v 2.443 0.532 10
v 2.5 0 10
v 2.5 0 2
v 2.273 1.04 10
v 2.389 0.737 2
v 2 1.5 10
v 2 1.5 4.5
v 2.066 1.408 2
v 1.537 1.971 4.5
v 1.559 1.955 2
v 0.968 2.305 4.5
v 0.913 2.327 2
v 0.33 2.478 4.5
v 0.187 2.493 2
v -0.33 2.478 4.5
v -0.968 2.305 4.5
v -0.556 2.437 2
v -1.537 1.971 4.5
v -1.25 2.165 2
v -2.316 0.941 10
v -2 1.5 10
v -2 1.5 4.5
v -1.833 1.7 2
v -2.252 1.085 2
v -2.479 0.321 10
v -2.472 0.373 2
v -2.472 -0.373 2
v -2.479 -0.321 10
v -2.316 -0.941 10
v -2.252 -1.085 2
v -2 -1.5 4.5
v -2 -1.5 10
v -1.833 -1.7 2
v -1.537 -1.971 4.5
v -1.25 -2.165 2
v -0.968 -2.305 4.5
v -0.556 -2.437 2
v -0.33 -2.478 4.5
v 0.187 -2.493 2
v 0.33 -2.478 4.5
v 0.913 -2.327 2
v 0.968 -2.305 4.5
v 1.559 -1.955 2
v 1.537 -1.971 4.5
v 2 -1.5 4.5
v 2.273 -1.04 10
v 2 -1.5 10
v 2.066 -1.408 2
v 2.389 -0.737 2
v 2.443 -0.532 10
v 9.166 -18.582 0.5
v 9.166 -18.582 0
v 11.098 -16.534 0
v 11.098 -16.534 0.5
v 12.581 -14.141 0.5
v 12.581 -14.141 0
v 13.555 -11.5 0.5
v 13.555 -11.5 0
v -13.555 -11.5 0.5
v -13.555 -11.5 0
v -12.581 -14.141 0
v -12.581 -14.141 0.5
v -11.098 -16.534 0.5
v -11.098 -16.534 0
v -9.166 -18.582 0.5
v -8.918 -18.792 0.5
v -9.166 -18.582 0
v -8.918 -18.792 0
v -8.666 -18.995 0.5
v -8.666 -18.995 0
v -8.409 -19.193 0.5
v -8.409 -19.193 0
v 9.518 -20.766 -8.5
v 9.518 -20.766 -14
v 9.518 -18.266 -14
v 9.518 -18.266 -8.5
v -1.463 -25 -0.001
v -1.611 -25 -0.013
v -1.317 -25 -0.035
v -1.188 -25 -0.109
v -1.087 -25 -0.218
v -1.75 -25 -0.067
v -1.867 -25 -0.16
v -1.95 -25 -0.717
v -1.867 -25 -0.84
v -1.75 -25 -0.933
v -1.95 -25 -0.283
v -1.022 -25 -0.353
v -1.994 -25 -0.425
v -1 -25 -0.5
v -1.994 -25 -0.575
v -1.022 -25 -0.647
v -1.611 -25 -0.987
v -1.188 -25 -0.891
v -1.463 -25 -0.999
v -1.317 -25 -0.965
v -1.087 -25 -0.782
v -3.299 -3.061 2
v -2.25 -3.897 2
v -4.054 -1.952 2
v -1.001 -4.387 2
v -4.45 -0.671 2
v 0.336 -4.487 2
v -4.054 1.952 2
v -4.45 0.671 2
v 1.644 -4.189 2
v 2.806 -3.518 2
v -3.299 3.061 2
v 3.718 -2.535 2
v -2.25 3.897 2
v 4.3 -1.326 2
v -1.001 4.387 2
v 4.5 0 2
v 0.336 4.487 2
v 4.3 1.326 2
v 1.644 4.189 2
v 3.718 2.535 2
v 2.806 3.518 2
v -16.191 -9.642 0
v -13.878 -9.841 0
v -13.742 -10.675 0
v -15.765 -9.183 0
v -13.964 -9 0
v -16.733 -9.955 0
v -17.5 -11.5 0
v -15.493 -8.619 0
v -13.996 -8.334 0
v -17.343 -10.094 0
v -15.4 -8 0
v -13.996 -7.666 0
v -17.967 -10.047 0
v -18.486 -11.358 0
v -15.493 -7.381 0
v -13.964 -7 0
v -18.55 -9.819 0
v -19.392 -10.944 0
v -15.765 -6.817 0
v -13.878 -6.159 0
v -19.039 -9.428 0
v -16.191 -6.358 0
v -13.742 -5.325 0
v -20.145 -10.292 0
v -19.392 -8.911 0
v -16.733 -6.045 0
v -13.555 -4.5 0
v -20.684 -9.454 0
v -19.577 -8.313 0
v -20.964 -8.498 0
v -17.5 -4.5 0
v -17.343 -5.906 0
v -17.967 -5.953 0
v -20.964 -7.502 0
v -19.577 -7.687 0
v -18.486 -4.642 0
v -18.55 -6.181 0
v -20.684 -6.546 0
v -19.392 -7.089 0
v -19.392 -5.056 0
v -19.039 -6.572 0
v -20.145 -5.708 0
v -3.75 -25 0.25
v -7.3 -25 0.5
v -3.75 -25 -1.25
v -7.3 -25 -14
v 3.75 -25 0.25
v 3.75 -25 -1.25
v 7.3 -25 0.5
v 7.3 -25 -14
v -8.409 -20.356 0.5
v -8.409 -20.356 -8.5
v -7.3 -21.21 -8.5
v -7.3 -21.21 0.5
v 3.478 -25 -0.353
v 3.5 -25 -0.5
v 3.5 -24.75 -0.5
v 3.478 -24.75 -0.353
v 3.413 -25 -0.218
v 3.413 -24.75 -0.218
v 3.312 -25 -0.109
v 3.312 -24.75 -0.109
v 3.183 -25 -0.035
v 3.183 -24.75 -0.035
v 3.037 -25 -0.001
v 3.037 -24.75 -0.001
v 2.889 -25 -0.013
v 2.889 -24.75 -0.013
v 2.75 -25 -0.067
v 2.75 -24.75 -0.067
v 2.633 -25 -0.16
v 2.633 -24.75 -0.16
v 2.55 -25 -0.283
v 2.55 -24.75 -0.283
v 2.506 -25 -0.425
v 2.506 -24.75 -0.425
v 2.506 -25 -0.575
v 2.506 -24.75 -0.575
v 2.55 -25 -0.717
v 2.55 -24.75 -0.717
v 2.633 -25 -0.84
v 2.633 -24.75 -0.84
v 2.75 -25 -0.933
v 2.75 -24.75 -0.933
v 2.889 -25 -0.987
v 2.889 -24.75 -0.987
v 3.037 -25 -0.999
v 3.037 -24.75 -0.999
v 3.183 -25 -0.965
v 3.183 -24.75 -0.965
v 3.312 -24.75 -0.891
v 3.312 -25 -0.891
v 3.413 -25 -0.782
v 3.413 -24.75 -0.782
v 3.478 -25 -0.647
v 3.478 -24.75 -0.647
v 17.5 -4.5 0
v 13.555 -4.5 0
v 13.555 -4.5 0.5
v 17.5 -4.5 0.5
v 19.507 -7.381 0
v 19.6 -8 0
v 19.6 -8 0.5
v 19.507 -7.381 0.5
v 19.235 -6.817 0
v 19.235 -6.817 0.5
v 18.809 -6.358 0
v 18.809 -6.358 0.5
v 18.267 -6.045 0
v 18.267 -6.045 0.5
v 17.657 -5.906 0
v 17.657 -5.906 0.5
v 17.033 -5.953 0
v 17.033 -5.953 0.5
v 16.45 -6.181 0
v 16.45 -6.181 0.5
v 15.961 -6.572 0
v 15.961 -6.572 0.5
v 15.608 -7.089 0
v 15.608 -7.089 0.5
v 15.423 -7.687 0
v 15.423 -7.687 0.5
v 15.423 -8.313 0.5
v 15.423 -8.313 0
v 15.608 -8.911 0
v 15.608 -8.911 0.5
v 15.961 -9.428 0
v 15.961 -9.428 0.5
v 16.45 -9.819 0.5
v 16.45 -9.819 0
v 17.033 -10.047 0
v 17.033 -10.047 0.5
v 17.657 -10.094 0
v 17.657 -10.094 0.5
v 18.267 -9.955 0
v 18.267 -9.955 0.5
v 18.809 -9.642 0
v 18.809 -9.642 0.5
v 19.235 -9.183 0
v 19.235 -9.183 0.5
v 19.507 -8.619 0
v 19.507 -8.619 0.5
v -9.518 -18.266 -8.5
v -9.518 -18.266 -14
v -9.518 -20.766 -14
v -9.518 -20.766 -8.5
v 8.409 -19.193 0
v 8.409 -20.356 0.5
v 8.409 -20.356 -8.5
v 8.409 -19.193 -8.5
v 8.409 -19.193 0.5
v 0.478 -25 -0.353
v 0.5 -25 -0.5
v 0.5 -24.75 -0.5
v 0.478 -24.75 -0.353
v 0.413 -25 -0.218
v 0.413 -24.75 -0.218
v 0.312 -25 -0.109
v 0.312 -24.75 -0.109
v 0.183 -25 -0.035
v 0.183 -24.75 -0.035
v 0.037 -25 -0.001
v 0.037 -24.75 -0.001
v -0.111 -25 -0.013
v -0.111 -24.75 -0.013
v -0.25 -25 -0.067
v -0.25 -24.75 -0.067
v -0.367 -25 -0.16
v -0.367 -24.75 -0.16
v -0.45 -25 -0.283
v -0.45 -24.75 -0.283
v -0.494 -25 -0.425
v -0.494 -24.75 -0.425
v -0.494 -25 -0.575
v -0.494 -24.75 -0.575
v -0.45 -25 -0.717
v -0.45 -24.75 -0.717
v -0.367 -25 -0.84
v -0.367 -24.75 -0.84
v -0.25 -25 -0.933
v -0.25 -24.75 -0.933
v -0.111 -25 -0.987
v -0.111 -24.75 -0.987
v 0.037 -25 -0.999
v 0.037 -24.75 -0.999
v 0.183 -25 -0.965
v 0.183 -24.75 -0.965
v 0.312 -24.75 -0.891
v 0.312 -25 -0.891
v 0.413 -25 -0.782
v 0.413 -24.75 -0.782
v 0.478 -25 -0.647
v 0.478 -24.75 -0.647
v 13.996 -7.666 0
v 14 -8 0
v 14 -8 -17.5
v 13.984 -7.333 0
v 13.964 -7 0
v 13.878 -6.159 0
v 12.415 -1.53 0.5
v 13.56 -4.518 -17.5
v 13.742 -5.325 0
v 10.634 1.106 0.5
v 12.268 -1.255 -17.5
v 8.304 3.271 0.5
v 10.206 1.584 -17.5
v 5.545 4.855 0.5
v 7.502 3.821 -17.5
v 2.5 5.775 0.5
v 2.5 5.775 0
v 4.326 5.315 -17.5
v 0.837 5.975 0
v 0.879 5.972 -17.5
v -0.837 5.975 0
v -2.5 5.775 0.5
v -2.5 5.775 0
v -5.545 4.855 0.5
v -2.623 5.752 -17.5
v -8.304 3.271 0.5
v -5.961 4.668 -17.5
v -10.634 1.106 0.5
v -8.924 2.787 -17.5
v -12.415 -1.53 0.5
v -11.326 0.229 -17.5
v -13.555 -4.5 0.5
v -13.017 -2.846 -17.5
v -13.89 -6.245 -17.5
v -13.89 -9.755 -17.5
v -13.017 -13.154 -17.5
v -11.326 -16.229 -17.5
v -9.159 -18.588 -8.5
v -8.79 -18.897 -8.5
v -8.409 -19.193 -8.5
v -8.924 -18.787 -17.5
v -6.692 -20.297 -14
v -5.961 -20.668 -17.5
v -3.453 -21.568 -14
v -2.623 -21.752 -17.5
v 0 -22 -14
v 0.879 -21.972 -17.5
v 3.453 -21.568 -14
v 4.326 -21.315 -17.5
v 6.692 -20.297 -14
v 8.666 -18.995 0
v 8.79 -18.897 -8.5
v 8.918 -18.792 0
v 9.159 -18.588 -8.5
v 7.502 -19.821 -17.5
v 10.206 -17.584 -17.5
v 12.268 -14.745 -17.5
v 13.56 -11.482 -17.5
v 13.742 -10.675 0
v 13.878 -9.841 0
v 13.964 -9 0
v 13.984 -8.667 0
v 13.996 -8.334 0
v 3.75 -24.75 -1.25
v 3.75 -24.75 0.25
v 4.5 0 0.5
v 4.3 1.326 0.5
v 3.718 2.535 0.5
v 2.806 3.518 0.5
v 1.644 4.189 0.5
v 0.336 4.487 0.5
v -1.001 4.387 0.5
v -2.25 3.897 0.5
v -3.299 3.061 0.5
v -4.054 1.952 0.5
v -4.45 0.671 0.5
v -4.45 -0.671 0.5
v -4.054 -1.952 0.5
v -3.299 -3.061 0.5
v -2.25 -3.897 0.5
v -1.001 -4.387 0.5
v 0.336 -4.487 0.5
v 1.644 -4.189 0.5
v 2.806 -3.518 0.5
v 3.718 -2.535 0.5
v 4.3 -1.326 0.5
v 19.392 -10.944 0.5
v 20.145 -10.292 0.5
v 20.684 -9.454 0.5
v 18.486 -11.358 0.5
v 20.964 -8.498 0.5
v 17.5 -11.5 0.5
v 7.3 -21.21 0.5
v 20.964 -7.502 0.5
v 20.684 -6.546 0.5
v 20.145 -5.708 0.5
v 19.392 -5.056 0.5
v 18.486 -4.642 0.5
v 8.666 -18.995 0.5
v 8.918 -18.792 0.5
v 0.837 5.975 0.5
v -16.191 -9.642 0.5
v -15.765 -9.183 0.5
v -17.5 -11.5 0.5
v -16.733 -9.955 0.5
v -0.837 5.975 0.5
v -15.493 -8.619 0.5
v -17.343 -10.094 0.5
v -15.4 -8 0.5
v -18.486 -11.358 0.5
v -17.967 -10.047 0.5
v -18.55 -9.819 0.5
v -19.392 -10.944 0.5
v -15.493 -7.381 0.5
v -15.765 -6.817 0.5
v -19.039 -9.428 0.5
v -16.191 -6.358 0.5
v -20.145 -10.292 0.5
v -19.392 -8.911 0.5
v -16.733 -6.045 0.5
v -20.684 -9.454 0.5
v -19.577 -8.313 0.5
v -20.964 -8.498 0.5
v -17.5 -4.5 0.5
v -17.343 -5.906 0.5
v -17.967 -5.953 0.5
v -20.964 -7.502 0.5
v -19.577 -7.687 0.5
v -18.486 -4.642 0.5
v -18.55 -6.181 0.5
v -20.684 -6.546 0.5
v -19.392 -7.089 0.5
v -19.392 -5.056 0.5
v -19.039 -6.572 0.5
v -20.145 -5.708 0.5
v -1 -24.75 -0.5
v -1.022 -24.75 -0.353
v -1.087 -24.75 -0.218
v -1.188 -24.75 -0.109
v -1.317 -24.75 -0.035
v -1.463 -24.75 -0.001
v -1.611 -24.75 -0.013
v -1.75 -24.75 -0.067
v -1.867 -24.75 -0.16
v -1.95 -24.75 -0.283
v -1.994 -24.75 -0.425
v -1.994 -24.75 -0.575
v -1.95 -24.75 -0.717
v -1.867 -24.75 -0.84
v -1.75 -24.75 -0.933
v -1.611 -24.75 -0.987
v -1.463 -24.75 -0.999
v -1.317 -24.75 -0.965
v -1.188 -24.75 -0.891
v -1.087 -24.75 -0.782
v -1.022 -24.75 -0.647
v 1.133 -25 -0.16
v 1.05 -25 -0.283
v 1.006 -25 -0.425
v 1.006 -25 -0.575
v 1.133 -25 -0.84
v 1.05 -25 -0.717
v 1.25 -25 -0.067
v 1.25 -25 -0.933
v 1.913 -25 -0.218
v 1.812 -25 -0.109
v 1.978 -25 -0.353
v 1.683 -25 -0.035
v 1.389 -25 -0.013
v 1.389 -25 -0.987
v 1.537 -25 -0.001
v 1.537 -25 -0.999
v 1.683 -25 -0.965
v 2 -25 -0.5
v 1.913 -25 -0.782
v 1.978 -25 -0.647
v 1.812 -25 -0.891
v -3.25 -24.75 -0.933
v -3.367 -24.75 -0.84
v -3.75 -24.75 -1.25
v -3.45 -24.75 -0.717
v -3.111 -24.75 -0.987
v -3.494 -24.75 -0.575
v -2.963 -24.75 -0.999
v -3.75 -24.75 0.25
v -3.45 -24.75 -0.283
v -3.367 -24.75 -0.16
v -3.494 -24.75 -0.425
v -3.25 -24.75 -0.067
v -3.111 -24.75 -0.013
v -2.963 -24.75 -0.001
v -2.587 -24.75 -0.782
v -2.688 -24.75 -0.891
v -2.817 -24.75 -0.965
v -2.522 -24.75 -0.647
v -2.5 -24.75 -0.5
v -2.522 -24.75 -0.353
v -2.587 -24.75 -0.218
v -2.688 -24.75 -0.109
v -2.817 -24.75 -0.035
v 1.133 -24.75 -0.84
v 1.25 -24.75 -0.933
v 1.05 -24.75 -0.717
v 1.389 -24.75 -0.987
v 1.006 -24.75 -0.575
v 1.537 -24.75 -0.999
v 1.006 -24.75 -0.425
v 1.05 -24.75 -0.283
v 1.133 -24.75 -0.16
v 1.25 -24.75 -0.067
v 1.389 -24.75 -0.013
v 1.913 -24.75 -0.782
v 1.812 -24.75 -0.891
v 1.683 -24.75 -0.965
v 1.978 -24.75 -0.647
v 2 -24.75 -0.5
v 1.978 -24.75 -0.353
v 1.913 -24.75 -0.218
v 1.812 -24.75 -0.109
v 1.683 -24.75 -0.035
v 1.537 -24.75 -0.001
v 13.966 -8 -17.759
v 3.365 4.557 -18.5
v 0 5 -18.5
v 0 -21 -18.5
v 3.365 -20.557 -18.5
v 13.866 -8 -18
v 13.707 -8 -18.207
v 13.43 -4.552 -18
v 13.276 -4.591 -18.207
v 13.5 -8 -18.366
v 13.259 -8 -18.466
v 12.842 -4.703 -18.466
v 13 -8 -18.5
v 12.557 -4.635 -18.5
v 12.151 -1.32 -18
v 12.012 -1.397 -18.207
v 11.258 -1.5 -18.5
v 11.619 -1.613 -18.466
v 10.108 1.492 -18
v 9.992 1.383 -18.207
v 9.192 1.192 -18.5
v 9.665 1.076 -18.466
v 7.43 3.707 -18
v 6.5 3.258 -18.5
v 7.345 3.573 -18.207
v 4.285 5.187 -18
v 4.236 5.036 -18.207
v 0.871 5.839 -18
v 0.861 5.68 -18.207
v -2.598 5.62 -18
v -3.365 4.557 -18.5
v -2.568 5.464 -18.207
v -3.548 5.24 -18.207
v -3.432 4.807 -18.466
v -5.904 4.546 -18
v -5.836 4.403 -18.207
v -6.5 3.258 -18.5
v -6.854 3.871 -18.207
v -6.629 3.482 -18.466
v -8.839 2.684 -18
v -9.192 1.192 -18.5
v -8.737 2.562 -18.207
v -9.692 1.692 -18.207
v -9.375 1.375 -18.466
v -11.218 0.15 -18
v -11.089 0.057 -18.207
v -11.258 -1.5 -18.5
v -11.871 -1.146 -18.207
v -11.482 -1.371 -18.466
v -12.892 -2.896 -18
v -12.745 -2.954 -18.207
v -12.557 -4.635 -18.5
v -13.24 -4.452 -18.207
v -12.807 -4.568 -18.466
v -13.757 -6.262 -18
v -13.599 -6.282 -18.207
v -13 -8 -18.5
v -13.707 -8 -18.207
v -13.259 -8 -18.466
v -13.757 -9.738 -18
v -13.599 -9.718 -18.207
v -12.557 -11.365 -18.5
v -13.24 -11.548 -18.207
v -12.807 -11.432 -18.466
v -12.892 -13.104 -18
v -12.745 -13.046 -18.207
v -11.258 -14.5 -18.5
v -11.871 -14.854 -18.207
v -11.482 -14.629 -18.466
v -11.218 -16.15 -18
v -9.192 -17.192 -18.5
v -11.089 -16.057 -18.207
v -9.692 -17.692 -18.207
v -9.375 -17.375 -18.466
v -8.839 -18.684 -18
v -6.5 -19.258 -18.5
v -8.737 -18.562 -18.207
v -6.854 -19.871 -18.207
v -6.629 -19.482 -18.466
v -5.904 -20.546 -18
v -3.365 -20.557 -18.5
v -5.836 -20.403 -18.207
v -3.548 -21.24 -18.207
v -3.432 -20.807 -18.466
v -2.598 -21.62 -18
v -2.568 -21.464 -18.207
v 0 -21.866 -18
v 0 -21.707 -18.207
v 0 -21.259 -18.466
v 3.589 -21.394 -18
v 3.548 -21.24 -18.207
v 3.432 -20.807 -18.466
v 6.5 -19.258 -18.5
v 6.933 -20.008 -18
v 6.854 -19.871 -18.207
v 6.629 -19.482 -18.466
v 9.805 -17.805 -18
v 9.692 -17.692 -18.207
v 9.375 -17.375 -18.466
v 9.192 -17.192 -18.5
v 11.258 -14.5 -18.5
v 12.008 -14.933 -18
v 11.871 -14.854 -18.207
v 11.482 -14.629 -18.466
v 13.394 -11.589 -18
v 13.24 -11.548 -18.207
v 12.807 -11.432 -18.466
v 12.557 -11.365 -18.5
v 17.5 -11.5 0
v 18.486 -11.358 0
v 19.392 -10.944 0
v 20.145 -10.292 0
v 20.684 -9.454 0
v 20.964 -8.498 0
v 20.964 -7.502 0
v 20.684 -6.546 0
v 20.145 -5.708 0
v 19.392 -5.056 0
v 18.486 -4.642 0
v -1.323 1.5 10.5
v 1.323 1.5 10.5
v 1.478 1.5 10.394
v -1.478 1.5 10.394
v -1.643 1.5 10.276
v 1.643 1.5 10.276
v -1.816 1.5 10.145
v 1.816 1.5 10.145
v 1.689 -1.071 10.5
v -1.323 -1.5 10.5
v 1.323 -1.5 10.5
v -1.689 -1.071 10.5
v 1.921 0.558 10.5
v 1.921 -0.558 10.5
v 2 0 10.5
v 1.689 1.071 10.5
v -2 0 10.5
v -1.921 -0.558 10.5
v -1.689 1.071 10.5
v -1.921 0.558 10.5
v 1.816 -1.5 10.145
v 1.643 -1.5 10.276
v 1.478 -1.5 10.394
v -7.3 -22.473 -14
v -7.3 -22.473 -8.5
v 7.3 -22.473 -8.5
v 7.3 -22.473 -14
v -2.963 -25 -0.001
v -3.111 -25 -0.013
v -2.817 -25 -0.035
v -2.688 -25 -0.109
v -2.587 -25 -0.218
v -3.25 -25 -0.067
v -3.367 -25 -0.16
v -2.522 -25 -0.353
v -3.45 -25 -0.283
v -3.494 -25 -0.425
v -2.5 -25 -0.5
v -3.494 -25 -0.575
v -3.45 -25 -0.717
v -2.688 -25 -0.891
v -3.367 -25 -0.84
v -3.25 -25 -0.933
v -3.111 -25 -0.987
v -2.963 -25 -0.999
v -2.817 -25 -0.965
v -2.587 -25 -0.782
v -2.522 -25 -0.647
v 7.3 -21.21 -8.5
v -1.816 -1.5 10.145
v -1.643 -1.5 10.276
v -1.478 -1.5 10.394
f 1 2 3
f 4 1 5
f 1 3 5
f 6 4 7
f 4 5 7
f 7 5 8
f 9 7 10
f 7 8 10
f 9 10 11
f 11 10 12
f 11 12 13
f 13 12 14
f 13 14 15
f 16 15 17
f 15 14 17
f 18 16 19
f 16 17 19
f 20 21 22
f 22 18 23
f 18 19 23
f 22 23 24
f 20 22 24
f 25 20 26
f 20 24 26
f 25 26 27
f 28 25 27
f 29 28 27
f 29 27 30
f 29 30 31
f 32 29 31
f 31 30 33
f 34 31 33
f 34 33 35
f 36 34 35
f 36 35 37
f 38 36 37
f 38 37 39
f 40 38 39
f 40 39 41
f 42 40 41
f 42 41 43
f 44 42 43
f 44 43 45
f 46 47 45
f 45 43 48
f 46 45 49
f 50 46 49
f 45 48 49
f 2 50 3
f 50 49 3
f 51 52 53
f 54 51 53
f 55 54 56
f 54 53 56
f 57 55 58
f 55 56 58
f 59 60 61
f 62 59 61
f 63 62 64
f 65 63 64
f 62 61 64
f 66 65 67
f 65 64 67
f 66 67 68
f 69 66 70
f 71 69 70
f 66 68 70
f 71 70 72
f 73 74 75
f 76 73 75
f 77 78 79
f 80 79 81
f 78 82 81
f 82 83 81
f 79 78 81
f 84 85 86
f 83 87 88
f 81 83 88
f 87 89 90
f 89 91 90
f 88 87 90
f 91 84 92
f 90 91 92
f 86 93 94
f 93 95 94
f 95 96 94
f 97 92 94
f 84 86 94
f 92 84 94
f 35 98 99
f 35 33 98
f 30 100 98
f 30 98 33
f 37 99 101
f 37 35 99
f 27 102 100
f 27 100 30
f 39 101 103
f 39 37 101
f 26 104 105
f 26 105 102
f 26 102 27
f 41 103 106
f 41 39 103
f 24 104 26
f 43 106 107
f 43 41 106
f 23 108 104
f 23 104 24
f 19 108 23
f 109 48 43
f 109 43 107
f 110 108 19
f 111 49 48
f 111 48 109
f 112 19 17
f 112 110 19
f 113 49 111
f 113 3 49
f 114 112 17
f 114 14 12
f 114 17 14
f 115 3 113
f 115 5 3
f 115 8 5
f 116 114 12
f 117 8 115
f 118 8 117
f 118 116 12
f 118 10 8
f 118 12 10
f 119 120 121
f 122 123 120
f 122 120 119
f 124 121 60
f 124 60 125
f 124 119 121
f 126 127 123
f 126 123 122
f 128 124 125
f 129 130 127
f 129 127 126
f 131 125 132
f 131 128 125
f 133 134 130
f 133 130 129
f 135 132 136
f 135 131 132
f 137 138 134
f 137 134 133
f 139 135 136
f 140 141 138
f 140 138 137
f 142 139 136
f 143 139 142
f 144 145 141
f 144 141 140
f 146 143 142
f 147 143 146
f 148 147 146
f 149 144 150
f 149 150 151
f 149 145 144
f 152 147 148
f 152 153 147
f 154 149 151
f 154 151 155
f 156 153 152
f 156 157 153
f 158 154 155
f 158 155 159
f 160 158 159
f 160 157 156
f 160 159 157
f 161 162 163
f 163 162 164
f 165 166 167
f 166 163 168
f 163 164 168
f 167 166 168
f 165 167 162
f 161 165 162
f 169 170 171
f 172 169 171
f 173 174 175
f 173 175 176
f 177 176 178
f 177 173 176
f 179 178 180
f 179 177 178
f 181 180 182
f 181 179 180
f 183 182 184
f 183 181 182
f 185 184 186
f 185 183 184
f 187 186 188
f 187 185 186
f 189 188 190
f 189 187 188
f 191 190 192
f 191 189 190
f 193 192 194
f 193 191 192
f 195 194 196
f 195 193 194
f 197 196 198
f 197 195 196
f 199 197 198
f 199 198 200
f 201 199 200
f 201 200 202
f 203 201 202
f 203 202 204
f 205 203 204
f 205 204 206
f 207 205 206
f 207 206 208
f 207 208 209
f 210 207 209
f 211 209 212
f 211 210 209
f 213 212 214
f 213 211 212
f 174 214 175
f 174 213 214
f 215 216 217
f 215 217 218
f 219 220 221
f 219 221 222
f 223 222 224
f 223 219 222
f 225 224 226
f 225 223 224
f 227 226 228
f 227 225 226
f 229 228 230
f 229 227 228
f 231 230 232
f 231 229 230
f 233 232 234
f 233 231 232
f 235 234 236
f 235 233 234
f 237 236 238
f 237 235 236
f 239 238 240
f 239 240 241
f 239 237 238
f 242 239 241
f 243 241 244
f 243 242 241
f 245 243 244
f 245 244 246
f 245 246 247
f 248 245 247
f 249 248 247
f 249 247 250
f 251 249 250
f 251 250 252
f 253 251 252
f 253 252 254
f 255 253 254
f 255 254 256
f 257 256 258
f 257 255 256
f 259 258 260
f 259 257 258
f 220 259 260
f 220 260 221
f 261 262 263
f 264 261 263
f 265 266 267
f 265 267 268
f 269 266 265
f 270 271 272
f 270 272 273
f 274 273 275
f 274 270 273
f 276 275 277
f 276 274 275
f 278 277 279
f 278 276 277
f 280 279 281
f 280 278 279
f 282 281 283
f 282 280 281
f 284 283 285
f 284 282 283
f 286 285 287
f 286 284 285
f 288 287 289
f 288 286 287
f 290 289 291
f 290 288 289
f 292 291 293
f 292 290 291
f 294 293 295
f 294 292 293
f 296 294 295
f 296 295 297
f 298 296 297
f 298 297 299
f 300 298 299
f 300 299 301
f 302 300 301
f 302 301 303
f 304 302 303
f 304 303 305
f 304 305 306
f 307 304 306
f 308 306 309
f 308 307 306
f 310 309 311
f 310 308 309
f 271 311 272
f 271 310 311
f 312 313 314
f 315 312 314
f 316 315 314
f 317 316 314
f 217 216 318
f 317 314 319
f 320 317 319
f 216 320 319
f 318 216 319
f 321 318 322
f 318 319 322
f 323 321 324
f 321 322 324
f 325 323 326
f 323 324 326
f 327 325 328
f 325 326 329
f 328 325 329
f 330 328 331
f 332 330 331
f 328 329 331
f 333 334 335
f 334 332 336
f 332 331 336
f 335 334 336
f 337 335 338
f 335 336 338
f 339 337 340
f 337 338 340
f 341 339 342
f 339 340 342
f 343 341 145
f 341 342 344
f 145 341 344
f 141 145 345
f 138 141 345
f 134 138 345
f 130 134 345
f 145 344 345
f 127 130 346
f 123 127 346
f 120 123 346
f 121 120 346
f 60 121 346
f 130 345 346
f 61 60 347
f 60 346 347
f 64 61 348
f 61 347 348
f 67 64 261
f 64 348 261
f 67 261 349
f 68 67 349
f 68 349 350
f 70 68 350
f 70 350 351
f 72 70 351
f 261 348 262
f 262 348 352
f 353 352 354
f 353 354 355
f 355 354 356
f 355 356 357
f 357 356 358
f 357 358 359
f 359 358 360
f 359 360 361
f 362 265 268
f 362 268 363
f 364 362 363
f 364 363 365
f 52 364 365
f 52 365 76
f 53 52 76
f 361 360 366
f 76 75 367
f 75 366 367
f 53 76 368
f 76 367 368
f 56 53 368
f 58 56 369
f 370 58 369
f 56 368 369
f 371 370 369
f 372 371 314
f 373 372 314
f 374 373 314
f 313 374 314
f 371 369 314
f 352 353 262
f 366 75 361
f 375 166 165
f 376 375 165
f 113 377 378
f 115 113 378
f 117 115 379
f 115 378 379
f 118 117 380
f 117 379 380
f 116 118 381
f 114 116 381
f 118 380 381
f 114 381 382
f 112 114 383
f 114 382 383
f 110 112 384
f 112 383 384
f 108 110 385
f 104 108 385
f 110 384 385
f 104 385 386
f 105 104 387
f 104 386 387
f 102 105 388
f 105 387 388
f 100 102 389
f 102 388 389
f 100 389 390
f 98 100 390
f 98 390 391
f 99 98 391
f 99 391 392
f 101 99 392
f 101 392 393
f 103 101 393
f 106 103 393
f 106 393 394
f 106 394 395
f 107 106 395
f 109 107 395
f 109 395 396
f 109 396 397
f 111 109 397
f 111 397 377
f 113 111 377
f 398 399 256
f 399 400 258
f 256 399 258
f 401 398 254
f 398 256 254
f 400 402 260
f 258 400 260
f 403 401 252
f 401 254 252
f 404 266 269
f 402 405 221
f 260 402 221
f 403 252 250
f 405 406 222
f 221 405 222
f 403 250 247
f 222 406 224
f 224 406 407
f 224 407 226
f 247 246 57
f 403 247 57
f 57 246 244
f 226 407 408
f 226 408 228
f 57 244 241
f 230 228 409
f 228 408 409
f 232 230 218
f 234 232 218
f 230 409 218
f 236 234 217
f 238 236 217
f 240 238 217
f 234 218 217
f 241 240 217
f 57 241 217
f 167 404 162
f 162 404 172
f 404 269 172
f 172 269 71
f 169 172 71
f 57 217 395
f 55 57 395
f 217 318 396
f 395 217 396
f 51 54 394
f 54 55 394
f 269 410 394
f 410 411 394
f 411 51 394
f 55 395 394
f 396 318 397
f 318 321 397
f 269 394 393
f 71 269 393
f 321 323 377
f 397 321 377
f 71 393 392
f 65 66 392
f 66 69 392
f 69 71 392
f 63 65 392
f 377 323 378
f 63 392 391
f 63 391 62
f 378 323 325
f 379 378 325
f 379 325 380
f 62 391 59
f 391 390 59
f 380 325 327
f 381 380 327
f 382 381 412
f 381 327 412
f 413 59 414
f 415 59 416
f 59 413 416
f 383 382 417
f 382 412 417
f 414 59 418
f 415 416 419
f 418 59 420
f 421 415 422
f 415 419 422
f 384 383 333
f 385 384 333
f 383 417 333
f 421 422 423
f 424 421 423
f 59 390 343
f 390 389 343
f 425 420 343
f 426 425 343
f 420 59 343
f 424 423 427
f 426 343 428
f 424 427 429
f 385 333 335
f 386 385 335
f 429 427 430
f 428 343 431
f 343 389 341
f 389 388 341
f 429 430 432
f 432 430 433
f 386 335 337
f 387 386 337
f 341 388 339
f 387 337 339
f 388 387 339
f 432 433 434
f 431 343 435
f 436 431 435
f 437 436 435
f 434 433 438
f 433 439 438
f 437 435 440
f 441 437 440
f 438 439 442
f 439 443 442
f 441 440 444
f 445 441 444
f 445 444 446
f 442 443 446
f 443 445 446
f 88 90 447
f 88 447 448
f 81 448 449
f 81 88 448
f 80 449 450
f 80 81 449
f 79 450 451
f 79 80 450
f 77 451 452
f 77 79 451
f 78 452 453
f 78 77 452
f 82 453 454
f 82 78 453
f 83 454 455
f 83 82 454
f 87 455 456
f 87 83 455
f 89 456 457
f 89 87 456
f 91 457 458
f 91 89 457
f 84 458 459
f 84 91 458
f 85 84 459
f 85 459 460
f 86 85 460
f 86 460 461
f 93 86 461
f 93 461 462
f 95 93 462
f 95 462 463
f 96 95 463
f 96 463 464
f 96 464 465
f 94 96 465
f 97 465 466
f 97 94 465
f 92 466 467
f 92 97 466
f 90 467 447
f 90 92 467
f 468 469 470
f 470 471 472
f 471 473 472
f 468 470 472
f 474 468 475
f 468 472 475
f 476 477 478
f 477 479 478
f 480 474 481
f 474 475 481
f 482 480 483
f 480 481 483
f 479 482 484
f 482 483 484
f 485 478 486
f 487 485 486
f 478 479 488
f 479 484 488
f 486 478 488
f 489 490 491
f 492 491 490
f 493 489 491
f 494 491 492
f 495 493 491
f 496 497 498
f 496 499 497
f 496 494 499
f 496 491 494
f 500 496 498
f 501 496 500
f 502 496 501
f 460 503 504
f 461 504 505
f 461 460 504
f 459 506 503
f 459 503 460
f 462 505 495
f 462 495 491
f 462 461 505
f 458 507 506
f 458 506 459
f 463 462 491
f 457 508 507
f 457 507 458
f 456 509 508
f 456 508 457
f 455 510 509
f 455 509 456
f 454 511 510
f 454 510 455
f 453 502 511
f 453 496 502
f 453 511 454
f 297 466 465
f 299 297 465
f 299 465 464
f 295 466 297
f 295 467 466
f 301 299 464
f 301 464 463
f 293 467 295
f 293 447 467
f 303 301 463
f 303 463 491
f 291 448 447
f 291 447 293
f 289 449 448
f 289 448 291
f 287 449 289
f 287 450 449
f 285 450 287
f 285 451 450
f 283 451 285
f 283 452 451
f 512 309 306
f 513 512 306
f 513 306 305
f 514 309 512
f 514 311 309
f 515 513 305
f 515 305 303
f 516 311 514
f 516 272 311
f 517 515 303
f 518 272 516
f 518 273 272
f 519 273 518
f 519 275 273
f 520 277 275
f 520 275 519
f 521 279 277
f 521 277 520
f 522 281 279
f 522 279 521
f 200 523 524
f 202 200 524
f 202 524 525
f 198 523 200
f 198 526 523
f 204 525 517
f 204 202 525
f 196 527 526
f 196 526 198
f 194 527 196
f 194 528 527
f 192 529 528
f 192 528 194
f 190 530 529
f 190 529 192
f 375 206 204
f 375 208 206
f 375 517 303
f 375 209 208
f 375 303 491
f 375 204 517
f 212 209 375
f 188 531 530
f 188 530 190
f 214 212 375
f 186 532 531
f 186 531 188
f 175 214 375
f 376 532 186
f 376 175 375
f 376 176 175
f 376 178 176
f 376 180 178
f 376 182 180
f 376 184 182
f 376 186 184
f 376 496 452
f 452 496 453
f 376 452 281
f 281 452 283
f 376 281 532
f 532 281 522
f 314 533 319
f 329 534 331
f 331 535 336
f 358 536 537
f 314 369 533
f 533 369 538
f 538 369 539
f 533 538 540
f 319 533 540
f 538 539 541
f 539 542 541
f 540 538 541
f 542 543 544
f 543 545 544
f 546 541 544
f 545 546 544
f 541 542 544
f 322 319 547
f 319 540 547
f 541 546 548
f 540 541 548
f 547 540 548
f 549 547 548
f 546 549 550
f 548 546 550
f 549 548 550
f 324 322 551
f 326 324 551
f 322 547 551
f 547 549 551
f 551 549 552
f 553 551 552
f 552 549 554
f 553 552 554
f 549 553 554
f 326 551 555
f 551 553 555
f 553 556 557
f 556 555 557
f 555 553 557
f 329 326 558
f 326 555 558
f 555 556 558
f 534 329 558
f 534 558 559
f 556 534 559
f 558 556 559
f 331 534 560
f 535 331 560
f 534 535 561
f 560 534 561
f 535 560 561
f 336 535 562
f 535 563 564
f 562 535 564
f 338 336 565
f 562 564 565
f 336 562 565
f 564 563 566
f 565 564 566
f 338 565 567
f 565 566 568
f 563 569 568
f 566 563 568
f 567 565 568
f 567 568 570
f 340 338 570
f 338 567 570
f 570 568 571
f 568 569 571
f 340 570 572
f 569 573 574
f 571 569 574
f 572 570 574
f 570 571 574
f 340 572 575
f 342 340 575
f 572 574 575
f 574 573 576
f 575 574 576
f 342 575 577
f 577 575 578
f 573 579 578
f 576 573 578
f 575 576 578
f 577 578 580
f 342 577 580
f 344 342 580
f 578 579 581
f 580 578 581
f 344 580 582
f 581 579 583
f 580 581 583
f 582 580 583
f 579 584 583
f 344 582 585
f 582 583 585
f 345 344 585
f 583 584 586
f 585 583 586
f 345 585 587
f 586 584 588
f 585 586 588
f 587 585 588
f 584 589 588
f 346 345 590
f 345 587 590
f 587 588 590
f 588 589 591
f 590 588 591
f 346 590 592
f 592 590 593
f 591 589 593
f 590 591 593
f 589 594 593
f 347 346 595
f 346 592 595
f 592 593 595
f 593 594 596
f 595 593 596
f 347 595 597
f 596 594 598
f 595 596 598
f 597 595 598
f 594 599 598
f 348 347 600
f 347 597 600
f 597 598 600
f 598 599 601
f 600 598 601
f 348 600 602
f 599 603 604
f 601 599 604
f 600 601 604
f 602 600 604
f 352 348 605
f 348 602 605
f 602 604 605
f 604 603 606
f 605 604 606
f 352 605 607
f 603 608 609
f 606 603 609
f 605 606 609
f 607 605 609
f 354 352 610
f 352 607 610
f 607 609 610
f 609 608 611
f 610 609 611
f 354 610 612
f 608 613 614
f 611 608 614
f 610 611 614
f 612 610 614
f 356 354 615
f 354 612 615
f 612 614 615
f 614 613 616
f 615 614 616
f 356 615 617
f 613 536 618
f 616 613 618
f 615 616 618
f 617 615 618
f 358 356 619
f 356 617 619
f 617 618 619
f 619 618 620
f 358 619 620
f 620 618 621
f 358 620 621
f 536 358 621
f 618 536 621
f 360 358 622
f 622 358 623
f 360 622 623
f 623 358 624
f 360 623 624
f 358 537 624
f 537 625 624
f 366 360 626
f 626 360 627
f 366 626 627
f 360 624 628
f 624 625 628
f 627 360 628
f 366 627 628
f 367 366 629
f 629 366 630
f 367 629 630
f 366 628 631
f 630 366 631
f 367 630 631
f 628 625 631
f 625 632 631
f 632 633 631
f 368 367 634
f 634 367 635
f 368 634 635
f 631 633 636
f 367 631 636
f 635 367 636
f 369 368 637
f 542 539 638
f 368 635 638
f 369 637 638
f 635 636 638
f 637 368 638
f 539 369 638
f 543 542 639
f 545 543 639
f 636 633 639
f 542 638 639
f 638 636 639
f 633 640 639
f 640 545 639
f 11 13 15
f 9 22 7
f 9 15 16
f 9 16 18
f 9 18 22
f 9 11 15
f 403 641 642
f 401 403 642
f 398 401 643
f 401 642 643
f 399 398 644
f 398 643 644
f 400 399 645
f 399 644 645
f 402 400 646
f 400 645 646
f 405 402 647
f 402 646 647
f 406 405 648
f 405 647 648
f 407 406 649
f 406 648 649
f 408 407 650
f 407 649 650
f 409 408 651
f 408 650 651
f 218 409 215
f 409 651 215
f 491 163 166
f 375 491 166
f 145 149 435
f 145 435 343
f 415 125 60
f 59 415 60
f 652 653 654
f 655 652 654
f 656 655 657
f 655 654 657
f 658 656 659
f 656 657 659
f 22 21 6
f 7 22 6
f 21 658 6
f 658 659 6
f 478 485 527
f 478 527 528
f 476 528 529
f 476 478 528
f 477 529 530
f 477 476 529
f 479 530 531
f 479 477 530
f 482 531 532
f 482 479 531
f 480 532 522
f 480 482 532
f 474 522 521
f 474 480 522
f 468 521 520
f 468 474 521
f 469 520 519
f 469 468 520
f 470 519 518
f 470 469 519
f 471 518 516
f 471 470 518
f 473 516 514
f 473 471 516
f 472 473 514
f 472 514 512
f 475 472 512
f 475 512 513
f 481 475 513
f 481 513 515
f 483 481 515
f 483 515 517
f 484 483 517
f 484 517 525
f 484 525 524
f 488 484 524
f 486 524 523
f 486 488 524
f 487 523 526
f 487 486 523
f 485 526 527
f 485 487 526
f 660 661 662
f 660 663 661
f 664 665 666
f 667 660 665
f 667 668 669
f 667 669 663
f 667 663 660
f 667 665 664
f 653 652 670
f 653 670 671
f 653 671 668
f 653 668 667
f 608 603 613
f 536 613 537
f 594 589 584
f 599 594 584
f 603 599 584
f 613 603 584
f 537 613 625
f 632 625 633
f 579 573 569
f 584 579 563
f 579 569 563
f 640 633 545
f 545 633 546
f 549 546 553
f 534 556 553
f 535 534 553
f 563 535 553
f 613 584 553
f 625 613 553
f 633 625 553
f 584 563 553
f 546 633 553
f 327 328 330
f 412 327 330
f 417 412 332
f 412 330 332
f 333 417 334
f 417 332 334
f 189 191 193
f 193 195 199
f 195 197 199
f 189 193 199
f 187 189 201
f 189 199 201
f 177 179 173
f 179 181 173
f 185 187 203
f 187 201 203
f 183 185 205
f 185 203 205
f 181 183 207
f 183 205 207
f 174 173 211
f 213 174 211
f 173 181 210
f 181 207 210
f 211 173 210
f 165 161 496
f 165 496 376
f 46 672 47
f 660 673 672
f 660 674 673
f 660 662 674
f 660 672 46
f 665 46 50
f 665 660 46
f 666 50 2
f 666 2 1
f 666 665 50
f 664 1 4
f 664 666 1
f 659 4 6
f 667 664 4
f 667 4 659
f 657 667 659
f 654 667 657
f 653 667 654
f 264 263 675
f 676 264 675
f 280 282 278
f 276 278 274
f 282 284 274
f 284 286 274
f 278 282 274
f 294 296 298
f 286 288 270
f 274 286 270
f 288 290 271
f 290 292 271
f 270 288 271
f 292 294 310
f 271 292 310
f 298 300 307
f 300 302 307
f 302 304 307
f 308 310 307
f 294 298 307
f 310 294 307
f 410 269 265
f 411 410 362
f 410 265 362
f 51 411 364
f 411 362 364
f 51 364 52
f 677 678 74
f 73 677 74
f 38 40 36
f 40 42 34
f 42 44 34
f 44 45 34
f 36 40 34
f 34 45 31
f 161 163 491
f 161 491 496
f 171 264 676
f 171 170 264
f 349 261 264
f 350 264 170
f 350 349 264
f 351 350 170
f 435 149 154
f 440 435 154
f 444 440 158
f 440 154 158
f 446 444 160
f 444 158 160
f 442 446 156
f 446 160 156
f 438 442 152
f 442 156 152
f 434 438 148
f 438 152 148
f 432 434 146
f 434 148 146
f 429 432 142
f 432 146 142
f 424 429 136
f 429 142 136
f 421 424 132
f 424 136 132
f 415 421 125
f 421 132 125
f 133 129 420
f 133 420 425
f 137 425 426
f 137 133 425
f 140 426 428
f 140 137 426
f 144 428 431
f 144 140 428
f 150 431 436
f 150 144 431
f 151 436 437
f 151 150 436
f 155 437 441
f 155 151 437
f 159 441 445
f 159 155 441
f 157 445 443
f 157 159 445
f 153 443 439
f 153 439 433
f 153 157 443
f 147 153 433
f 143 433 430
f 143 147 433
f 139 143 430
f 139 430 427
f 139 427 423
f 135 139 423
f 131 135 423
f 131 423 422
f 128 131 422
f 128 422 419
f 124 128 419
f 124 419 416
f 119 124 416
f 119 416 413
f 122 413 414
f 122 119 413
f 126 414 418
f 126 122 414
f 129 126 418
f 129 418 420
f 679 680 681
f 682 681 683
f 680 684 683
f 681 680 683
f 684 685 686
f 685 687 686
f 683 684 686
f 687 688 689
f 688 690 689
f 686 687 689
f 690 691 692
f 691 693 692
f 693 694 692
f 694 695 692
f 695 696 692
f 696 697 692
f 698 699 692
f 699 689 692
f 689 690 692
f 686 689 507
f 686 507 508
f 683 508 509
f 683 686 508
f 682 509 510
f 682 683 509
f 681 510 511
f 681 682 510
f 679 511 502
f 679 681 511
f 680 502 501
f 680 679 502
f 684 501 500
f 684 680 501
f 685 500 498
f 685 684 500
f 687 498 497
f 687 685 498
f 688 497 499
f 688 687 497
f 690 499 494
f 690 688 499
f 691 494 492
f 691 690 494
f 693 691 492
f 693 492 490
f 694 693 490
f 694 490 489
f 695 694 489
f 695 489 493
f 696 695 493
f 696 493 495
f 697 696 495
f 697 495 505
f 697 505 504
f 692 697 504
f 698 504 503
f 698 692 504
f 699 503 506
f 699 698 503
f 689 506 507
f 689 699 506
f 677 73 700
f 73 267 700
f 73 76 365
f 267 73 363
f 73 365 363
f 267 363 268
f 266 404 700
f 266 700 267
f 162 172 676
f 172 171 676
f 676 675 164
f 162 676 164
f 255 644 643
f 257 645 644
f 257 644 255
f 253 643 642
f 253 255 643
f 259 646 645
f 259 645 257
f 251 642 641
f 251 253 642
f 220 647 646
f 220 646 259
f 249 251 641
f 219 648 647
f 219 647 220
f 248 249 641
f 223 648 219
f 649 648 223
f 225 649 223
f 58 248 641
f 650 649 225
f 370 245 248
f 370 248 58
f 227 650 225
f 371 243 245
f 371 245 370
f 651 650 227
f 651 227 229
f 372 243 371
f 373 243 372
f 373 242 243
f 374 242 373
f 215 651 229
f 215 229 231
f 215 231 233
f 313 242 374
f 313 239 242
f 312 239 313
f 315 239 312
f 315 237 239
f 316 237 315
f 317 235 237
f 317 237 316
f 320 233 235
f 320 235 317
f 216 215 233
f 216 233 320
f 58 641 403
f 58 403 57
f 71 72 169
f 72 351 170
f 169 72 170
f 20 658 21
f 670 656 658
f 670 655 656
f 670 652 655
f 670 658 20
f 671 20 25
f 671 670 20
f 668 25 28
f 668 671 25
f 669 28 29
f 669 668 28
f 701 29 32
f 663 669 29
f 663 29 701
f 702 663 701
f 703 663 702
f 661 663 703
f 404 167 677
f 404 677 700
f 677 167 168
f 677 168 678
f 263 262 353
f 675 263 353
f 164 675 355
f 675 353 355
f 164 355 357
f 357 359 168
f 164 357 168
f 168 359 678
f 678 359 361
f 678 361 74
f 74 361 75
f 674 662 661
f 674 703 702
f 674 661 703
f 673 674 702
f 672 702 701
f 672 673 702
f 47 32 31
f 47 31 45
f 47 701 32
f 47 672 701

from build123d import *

# Parameters (mm, degrees)
SKETCH002_R     = 14
PAD001_DEPTH    = 18.5
SKETCH003_R     = 0.5
PAD002_DEPTH    = 0.5
SKETCH004_R     = 4.5
SKETCH004_R_2   = 4
PAD003_DEPTH    = 2
POCKET_DEPTH    = 6
FILLET_R        = 1
SKETCH007_R     = 4
SKETCH007_R_2   = 2.5
PAD005_DEPTH    = 2
PAD006_DEPTH    = 14
PAD007_DEPTH    = 0.5
POCKET001_DEPTH = 8.5
SKETCH011_W     = 7.5
SKETCH011_H     = 1.5
SKETCH011_R     = 0.5
POCKET002_DEPTH = 0.25
SKETCH012_R     = 2.5
PAD008_DEPTH    = 10.5
POCKET003_DEPTH = 6
CHAMFER_SIZE    = 0.5
SKETCH001_R     = 4.5
SKETCH001_R_2   = 0.5
SKETCH001_R_3   = 2.1
PAD_DEPTH       = 0.5


with BuildPart() as body001:
    # Sketch002 → Pad001 (new body)
    with BuildSketch(Plane.XY):
        with Locations((0, -8)):
            Circle(SKETCH002_R)
    extrude(amount=-PAD001_DEPTH)

    # Sketch003 → Pad002 (join)
    with BuildSketch(Plane.XY):
        with Locations((0, -12)):
            Circle(SKETCH003_R)
        with Locations((7, -8)):
            Circle(SKETCH003_R)
        with Locations((6, -4)):
            Circle(SKETCH003_R)
        with BuildLine():
            ThreePointArc((-10.8742815855, 0), (-12.1662090508, -2.1490720964), (-13.0384048104, -4.5))
            Line((-13.0384048104, -4.5), (-13.5554417117, -4.5))
            ThreePointArc((-2.5, 5.774977314), (-9.5309019426, 2.254848032), (-13.5554417117, -4.5))
            Line((-2.5, 5.2664991614), (-2.5, 5.774977314))
            ThreePointArc((-2.5, 5.2664991614), (-6.2865544647, 3.9469340402), (-9.5184693635, 1.5733348932))
            Line((-9.1659334611, 1.2187669342), (-9.5184693635, 1.5733348932))
            ThreePointArc((-9.1659334611, 1.2187669342), (-9.8479109981, 0.4863802044), (-10.4715304156, -0.2962962963))
            Line((-10.8742815855, 0), (-10.4715304156, -0.2962962963))
        make_face()
        with BuildLine():
            Line((-13.9642400438, -7), (-13.4629120178, -7))
            ThreePointArc((-13.4629120178, -7), (-13.5, -8), (-13.4629120178, -9))
            Line((-13.9642400438, -9), (-13.4629120178, -9))
            ThreePointArc((-13.9642400438, -7), (-14, -8), (-13.9642400438, -9))
        make_face()
        with BuildLine():
            Line((-9.1659334611, -18.5823279002), (-9.1659334611, -17.9113906081))
            ThreePointArc((-9.5184693635, -17.5733348932), (-9.3437303923, -17.7439572226), (-9.1659334611, -17.9113906081))
            Line((-9.5184693635, -17.5733348932), (-9.1659334611, -17.2187669342))
            ThreePointArc((-10.4715304156, -15.7037037037), (-9.8479109981, -16.4863802044), (-9.1659334611, -17.2187669342))
            Line((-10.4715304156, -15.7037037037), (-10.8742815855, -16))
            ThreePointArc((-13.0384048104, -11.5), (-12.1662090508, -13.8509279036), (-10.8742815855, -16))
            Line((-13.0384048104, -11.5), (-13.5554417117, -11.5))
            ThreePointArc((-13.5554417117, -11.5), (-11.8997926267, -15.3752922276), (-9.1659334611, -18.5823279002))
        make_face()
        with BuildLine():
            Line((2.5, 5.774977314), (2.5, 5.2664991614))
            ThreePointArc((9.5184693635, 1.5733348932), (6.2865544647, 3.9469340402), (2.5, 5.2664991614))
            Line((9.1659334611, 1.2187669342), (9.5184693635, 1.5733348932))
            ThreePointArc((10.4715304156, -0.2962962963), (9.8479109981, 0.4863802044), (9.1659334611, 1.2187669342))
            Line((10.4715304156, -0.2962962963), (10.8742815855, 0))
            ThreePointArc((13.0384048104, -4.5), (12.1662090508, -2.1490720964), (10.8742815855, 0))
            Line((13.0384048104, -4.5), (13.5554417117, -4.5))
            ThreePointArc((13.5554417117, -4.5), (9.5309019426, 2.254848032), (2.5, 5.774977314))
        make_face()
        with BuildLine():
            Line((13.0384048104, -11.5), (13.5554417117, -11.5))
            ThreePointArc((9.1659334611, -18.5823279002), (11.8997926267, -15.3752922276), (13.5554417117, -11.5))
            Line((9.1659334611, -17.9113906081), (9.1659334611, -18.5823279002))
            ThreePointArc((9.1659334611, -17.9113906081), (9.3437303923, -17.7439572226), (9.5184693635, -17.5733348932))
            Line((9.1659334611, -17.2187669342), (9.5184693635, -17.5733348932))
            ThreePointArc((9.1659334611, -17.2187669342), (9.8479109981, -16.4863802044), (10.4715304156, -15.7037037037))
            Line((10.4715304156, -15.7037037037), (10.8742815855, -16))
            ThreePointArc((10.8742815855, -16), (12.1662090508, -13.8509279036), (13.0384048104, -11.5))
        make_face()
        with BuildLine():
            ThreePointArc((13.4629120178, -9), (13.5, -8), (13.4629120178, -7))
            Line((13.4629120178, -7), (13.9642400438, -7))
            ThreePointArc((13.9642400438, -9), (14, -8), (13.9642400438, -7))
            Line((13.4629120178, -9), (13.9642400438, -9))
        make_face()
    extrude(amount=PAD002_DEPTH)

    # Sketch004 → Pad003 (join)
    with BuildSketch(Plane.XY):
        Circle(SKETCH004_R)
        Circle(SKETCH004_R_2, mode=Mode.SUBTRACT)
    extrude(amount=PAD003_DEPTH)

    # Sketch006 → Pocket (cut)
    with BuildSketch(Plane.XY.offset(10.5)):
        with BuildLine():
            Line((-2.0000003272, 1.4999995637), (2.0000003272, 1.4999995637))
            ThreePointArc((2.0000003272, 1.4999995637), (0, 2.5), (-2.0000003272, 1.4999995637))
        make_face()
        with BuildLine():
            Line((-1.9999996728, -1.5000004363), (1.9999996728, -1.5000004363))
            ThreePointArc((-1.9999996728, -1.5000004363), (0, -2.5), (1.9999996728, -1.5000004363))
        make_face()
    extrude(amount=-POCKET_DEPTH, mode=Mode.SUBTRACT)

    # Fillet
    fillet_edges = [body001.edges().sort_by_distance(p)[0] for p in [
        (-14, -8, -18.5),
    ]]
    fillet(fillet_edges, radius=FILLET_R)


with BuildPart() as body002:
    # Sketch007 → Pad005 (new body)
    with BuildSketch(Plane.XY):
        Circle(SKETCH007_R)
        Circle(SKETCH007_R_2, mode=Mode.SUBTRACT)
    extrude(amount=PAD005_DEPTH)


with BuildPart() as body003:
    # Sketch008 → Pad006 (new body)
    with BuildSketch(Plane.XY):
        with BuildLine():
            Line((-9.5184693635, -18.2663888966), (-9.5184693635, -20.7663888966))
            Line((-9.5184693635, -20.7663888966), (-7.3, -22.4730645401))
            Line((-7.3, -22.4730645401), (-7.3, -25))
            Line((-7.3, -25), (7.3, -25))
            Line((7.3, -25), (7.3, -22.4730645401))
            Line((7.3, -22.4730645401), (9.5184693635, -20.7663888966))
            Line((9.5184693635, -20.7663888966), (9.5184693635, -18.2663888966))
            ThreePointArc((-9.5184693635, -18.2663888966), (0, -22), (9.5184693635, -18.2663888966))
        make_face()
    extrude(amount=-PAD006_DEPTH)

    # Sketch009 → Pad007 (join)
    with BuildSketch(Plane.XY):
        with BuildLine():
            Line((-9.5184693635, -18.2663888966), (-9.5184693635, -20.7663888966))
            Line((-9.5184693635, -20.7663888966), (-7.3, -22.4730645401))
            Line((-7.3, -22.4730645401), (-7.3, -25))
            Line((-7.3, -25), (7.3, -25))
            Line((7.3, -25), (7.3, -22.4730645401))
            Line((7.3, -22.4730645401), (9.5184693635, -20.7663888966))
            Line((9.5184693635, -20.7663888966), (9.5184693635, -18.2663888966))
            ThreePointArc((5.8, -20.742056349), (7.7586150983, -19.6534926849), (9.5184693635, -18.2663888966))
            Line((5.8, -20.742056349), (5.8, -23.5))
            Line((5.8, -23.5), (-5.8, -23.5))
            Line((-5.8, -23.5), (-5.8, -20.742056349))
            ThreePointArc((-9.5184693635, -18.2663888966), (-7.7586150983, -19.6534926849), (-5.8, -20.742056349))
        make_face()
    extrude(amount=PAD007_DEPTH)

    # Sketch010 → Pocket001 (cut, symmetric)
    with BuildSketch(Plane.XY):
        with BuildLine():
            Line((-9.5184693635, -18.2663888966), (-9.5184693635, -20.7663888966))
            Line((-9.5184693635, -20.7663888966), (-7.3, -22.4730645401))
            Line((-7.3, -21.2095968101), (-7.3, -22.4730645401))
            Line((-8.4092346817, -20.3562589884), (-7.3, -21.2095968101))
            Line((-8.4092346817, -19.1930680364), (-8.4092346817, -20.3562589884))
            ThreePointArc((-9.5184693635, -18.2663888966), (-8.9758189955, -18.7440529299), (-8.4092346817, -19.1930680364))
        make_face()
        with BuildLine():
            Line((9.5184693635, -18.2663888966), (9.5184693635, -20.7663888966))
            Line((9.5184693635, -20.7663888966), (7.3, -22.4730645401))
            Line((7.3, -22.4730645401), (7.3, -21.2095968101))
            Line((7.3, -21.2095968101), (8.4092346817, -20.3562589884))
            Line((8.4092346817, -20.3562589884), (8.4092346817, -19.1930680364))
            ThreePointArc((8.4092346817, -19.1930680364), (8.9758189955, -18.7440529299), (9.5184693635, -18.2663888966))
        make_face()
    extrude(amount=POCKET001_DEPTH, both=True, mode=Mode.SUBTRACT)

    # Sketch011 (on Face10 of Pocket001) → Pocket002 (cut)
    with BuildSketch(Plane.XZ.offset(25)):
        with Locations((0, -0.5)):
            Rectangle(SKETCH011_W, SKETCH011_H)
        with Locations((0, -0.5)):
            Circle(SKETCH011_R, mode=Mode.SUBTRACT)
        with Locations((-1.5, -0.5)):
            Circle(SKETCH011_R, mode=Mode.SUBTRACT)
        with Locations((-3, -0.5)):
            Circle(SKETCH011_R, mode=Mode.SUBTRACT)
        with Locations((1.5, -0.5)):
            Circle(SKETCH011_R, mode=Mode.SUBTRACT)
        with Locations((3, -0.5)):
            Circle(SKETCH011_R, mode=Mode.SUBTRACT)
    extrude(amount=-POCKET002_DEPTH, mode=Mode.SUBTRACT)


with BuildPart() as body004:
    # Sketch012 → Pad008 (new body)
    with BuildSketch(Plane.XY):
        Circle(SKETCH012_R)
    extrude(amount=PAD008_DEPTH)

    # Sketch013 (on Face3 of Pad008) → Pocket003 (cut)
    with BuildSketch(Plane.XY.offset(10.5)):
        with BuildLine():
            Line((-2, 1.5), (2, 1.5))
            ThreePointArc((2, 1.5), (0, 2.5), (-2, 1.5))
        make_face()
        with BuildLine():
            Line((-2, -1.5), (2, -1.5))
            ThreePointArc((-2, -1.5), (0, -2.5), (2, -1.5))
        make_face()
    extrude(amount=-POCKET003_DEPTH, mode=Mode.SUBTRACT)

    # Chamfer
    chamfer_edges = [body004.edges().sort_by_distance(p)[0] for p in [
        (-2.5, 0, 10.5),
        (2.371708, -0.790569, 10.5),
        (2.371708, 0.790569, 10.5),
    ]]
    chamfer(chamfer_edges, length=CHAMFER_SIZE)


with BuildPart() as fusion:
    # Sketch001 → Pad (new body)
    with BuildSketch(Plane.XY):
        with BuildLine():
            Line((-17.5, -4.5), (-13.0384048104, -4.5))
            ThreePointArc((-10.8742815855, 0), (-12.1662090508, -2.1490720964), (-13.0384048104, -4.5))
            Line((-10.8742815855, 0), (-10.4715304156, -0.2962962963))
            ThreePointArc((-9.1659334611, 1.2187669342), (-9.8479109981, 0.4863802044), (-10.4715304156, -0.2962962963))
            Line((-9.5184693635, 1.5733348932), (-9.1659334611, 1.2187669342))
            ThreePointArc((-2.5, 5.2664991614), (-6.2865544647, 3.9469340402), (-9.5184693635, 1.5733348932))
            Line((-2.5, 5.2664991614), (-2.5, 5.774977314))
            ThreePointArc((2.5, 5.774977314), (0, 6), (-2.5, 5.774977314))
            Line((2.5, 5.774977314), (2.5, 5.2664991614))
            ThreePointArc((9.5184693635, 1.5733348932), (6.2865544647, 3.9469340402), (2.5, 5.2664991614))
            Line((9.1659334611, 1.2187669342), (9.5184693635, 1.5733348932))
            ThreePointArc((10.4715304156, -0.2962962963), (9.8479109981, 0.4863802044), (9.1659334611, 1.2187669342))
            Line((10.4715304156, -0.2962962963), (10.8742815855, 0))
            ThreePointArc((13.0384048104, -4.5), (12.1662090508, -2.1490720964), (10.8742815855, 0))
            Line((13.0384048104, -4.5), (17.5, -4.5))
            ThreePointArc((17.499999975, -11.5), (21, -8.0000000125), (17.5, -4.5))
            Line((17.499999975, -11.5), (13.0384048104, -11.5))
            ThreePointArc((10.8742815855, -16), (12.1662090508, -13.8509279036), (13.0384048104, -11.5))
            Line((10.4715304156, -15.7037037037), (10.8742815855, -16))
            ThreePointArc((9.1659334611, -17.2187669342), (9.8479109981, -16.4863802044), (10.4715304156, -15.7037037037))
            Line((9.1659334611, -17.2187669342), (9.5184693635, -17.5733348932))
            ThreePointArc((9.1659334611, -17.9113906081), (9.3437303923, -17.7439572226), (9.5184693635, -17.5733348932))
            Line((9.1659334611, -17.9113906081), (9.1659334611, -18.5823279002))
            ThreePointArc((5.8, -20.742056349), (7.5604826456, -19.7830005587), (9.1659334611, -18.5823279002))
            Line((5.8, -23.5), (5.8, -20.742056349))
            Line((-5.8, -23.5), (5.8, -23.5))
            Line((-5.8, -20.742056349), (-5.8, -23.5))
            ThreePointArc((-9.1659334611, -18.5823279002), (-7.5604826456, -19.7830005587), (-5.8, -20.742056349))
            Line((-9.1659334611, -18.5823279002), (-9.1659334611, -17.9113906081))
            ThreePointArc((-9.5184693635, -17.5733348932), (-9.3437303923, -17.7439572226), (-9.1659334611, -17.9113906081))
            Line((-9.1659334611, -17.2187669342), (-9.5184693635, -17.5733348932))
            ThreePointArc((-10.4715304156, -15.7037037037), (-9.8479109981, -16.4863802044), (-9.1659334611, -17.2187669342))
            Line((-10.8742815855, -16), (-10.4715304156, -15.7037037037))
            ThreePointArc((-13.0384048104, -11.5), (-12.1662090508, -13.8509279036), (-10.8742815855, -16))
            Line((-17.499999975, -11.5), (-13.0384048104, -11.5))
            ThreePointArc((-17.5, -4.5), (-21, -8.0000000125), (-17.499999975, -11.5))
        make_face()
        Circle(SKETCH001_R, mode=Mode.SUBTRACT)
        with Locations((6, -4)):
            Circle(SKETCH001_R_2, mode=Mode.SUBTRACT)
        with Locations((7, -8)):
            Circle(SKETCH001_R_2, mode=Mode.SUBTRACT)
        with Locations((0, -12)):
            Circle(SKETCH001_R_2, mode=Mode.SUBTRACT)
        with Locations((17.5, -8)):
            Circle(SKETCH001_R_3, mode=Mode.SUBTRACT)
        with Locations((-17.5, -8)):
            Circle(SKETCH001_R_3, mode=Mode.SUBTRACT)
        with BuildLine():
            Line((-13.9642400438, -7), (-13.4629120178, -7))
            ThreePointArc((-13.4629120178, -7), (-13.5, -8), (-13.4629120178, -9))
            Line((-13.9642400438, -9), (-13.4629120178, -9))
            ThreePointArc((-13.9642400438, -7), (-14, -8), (-13.9642400438, -9))
        make_face(mode=Mode.SUBTRACT)
        with BuildLine():
            Line((13.4629120178, -7), (13.9642400438, -7))
            ThreePointArc((13.9642400438, -9), (14, -8), (13.9642400438, -7))
            Line((13.4629120178, -9), (13.9642400438, -9))
            ThreePointArc((13.4629120178, -9), (13.5, -8), (13.4629120178, -7))
        make_face(mode=Mode.SUBTRACT)
    extrude(amount=PAD_DEPTH)

    # Fusion: union Body001, Body002, Body003, Body004
    add(body001.part)
    add(body002.part)
    add(body003.part)
    add(body004.part)


solid = fusion.part
